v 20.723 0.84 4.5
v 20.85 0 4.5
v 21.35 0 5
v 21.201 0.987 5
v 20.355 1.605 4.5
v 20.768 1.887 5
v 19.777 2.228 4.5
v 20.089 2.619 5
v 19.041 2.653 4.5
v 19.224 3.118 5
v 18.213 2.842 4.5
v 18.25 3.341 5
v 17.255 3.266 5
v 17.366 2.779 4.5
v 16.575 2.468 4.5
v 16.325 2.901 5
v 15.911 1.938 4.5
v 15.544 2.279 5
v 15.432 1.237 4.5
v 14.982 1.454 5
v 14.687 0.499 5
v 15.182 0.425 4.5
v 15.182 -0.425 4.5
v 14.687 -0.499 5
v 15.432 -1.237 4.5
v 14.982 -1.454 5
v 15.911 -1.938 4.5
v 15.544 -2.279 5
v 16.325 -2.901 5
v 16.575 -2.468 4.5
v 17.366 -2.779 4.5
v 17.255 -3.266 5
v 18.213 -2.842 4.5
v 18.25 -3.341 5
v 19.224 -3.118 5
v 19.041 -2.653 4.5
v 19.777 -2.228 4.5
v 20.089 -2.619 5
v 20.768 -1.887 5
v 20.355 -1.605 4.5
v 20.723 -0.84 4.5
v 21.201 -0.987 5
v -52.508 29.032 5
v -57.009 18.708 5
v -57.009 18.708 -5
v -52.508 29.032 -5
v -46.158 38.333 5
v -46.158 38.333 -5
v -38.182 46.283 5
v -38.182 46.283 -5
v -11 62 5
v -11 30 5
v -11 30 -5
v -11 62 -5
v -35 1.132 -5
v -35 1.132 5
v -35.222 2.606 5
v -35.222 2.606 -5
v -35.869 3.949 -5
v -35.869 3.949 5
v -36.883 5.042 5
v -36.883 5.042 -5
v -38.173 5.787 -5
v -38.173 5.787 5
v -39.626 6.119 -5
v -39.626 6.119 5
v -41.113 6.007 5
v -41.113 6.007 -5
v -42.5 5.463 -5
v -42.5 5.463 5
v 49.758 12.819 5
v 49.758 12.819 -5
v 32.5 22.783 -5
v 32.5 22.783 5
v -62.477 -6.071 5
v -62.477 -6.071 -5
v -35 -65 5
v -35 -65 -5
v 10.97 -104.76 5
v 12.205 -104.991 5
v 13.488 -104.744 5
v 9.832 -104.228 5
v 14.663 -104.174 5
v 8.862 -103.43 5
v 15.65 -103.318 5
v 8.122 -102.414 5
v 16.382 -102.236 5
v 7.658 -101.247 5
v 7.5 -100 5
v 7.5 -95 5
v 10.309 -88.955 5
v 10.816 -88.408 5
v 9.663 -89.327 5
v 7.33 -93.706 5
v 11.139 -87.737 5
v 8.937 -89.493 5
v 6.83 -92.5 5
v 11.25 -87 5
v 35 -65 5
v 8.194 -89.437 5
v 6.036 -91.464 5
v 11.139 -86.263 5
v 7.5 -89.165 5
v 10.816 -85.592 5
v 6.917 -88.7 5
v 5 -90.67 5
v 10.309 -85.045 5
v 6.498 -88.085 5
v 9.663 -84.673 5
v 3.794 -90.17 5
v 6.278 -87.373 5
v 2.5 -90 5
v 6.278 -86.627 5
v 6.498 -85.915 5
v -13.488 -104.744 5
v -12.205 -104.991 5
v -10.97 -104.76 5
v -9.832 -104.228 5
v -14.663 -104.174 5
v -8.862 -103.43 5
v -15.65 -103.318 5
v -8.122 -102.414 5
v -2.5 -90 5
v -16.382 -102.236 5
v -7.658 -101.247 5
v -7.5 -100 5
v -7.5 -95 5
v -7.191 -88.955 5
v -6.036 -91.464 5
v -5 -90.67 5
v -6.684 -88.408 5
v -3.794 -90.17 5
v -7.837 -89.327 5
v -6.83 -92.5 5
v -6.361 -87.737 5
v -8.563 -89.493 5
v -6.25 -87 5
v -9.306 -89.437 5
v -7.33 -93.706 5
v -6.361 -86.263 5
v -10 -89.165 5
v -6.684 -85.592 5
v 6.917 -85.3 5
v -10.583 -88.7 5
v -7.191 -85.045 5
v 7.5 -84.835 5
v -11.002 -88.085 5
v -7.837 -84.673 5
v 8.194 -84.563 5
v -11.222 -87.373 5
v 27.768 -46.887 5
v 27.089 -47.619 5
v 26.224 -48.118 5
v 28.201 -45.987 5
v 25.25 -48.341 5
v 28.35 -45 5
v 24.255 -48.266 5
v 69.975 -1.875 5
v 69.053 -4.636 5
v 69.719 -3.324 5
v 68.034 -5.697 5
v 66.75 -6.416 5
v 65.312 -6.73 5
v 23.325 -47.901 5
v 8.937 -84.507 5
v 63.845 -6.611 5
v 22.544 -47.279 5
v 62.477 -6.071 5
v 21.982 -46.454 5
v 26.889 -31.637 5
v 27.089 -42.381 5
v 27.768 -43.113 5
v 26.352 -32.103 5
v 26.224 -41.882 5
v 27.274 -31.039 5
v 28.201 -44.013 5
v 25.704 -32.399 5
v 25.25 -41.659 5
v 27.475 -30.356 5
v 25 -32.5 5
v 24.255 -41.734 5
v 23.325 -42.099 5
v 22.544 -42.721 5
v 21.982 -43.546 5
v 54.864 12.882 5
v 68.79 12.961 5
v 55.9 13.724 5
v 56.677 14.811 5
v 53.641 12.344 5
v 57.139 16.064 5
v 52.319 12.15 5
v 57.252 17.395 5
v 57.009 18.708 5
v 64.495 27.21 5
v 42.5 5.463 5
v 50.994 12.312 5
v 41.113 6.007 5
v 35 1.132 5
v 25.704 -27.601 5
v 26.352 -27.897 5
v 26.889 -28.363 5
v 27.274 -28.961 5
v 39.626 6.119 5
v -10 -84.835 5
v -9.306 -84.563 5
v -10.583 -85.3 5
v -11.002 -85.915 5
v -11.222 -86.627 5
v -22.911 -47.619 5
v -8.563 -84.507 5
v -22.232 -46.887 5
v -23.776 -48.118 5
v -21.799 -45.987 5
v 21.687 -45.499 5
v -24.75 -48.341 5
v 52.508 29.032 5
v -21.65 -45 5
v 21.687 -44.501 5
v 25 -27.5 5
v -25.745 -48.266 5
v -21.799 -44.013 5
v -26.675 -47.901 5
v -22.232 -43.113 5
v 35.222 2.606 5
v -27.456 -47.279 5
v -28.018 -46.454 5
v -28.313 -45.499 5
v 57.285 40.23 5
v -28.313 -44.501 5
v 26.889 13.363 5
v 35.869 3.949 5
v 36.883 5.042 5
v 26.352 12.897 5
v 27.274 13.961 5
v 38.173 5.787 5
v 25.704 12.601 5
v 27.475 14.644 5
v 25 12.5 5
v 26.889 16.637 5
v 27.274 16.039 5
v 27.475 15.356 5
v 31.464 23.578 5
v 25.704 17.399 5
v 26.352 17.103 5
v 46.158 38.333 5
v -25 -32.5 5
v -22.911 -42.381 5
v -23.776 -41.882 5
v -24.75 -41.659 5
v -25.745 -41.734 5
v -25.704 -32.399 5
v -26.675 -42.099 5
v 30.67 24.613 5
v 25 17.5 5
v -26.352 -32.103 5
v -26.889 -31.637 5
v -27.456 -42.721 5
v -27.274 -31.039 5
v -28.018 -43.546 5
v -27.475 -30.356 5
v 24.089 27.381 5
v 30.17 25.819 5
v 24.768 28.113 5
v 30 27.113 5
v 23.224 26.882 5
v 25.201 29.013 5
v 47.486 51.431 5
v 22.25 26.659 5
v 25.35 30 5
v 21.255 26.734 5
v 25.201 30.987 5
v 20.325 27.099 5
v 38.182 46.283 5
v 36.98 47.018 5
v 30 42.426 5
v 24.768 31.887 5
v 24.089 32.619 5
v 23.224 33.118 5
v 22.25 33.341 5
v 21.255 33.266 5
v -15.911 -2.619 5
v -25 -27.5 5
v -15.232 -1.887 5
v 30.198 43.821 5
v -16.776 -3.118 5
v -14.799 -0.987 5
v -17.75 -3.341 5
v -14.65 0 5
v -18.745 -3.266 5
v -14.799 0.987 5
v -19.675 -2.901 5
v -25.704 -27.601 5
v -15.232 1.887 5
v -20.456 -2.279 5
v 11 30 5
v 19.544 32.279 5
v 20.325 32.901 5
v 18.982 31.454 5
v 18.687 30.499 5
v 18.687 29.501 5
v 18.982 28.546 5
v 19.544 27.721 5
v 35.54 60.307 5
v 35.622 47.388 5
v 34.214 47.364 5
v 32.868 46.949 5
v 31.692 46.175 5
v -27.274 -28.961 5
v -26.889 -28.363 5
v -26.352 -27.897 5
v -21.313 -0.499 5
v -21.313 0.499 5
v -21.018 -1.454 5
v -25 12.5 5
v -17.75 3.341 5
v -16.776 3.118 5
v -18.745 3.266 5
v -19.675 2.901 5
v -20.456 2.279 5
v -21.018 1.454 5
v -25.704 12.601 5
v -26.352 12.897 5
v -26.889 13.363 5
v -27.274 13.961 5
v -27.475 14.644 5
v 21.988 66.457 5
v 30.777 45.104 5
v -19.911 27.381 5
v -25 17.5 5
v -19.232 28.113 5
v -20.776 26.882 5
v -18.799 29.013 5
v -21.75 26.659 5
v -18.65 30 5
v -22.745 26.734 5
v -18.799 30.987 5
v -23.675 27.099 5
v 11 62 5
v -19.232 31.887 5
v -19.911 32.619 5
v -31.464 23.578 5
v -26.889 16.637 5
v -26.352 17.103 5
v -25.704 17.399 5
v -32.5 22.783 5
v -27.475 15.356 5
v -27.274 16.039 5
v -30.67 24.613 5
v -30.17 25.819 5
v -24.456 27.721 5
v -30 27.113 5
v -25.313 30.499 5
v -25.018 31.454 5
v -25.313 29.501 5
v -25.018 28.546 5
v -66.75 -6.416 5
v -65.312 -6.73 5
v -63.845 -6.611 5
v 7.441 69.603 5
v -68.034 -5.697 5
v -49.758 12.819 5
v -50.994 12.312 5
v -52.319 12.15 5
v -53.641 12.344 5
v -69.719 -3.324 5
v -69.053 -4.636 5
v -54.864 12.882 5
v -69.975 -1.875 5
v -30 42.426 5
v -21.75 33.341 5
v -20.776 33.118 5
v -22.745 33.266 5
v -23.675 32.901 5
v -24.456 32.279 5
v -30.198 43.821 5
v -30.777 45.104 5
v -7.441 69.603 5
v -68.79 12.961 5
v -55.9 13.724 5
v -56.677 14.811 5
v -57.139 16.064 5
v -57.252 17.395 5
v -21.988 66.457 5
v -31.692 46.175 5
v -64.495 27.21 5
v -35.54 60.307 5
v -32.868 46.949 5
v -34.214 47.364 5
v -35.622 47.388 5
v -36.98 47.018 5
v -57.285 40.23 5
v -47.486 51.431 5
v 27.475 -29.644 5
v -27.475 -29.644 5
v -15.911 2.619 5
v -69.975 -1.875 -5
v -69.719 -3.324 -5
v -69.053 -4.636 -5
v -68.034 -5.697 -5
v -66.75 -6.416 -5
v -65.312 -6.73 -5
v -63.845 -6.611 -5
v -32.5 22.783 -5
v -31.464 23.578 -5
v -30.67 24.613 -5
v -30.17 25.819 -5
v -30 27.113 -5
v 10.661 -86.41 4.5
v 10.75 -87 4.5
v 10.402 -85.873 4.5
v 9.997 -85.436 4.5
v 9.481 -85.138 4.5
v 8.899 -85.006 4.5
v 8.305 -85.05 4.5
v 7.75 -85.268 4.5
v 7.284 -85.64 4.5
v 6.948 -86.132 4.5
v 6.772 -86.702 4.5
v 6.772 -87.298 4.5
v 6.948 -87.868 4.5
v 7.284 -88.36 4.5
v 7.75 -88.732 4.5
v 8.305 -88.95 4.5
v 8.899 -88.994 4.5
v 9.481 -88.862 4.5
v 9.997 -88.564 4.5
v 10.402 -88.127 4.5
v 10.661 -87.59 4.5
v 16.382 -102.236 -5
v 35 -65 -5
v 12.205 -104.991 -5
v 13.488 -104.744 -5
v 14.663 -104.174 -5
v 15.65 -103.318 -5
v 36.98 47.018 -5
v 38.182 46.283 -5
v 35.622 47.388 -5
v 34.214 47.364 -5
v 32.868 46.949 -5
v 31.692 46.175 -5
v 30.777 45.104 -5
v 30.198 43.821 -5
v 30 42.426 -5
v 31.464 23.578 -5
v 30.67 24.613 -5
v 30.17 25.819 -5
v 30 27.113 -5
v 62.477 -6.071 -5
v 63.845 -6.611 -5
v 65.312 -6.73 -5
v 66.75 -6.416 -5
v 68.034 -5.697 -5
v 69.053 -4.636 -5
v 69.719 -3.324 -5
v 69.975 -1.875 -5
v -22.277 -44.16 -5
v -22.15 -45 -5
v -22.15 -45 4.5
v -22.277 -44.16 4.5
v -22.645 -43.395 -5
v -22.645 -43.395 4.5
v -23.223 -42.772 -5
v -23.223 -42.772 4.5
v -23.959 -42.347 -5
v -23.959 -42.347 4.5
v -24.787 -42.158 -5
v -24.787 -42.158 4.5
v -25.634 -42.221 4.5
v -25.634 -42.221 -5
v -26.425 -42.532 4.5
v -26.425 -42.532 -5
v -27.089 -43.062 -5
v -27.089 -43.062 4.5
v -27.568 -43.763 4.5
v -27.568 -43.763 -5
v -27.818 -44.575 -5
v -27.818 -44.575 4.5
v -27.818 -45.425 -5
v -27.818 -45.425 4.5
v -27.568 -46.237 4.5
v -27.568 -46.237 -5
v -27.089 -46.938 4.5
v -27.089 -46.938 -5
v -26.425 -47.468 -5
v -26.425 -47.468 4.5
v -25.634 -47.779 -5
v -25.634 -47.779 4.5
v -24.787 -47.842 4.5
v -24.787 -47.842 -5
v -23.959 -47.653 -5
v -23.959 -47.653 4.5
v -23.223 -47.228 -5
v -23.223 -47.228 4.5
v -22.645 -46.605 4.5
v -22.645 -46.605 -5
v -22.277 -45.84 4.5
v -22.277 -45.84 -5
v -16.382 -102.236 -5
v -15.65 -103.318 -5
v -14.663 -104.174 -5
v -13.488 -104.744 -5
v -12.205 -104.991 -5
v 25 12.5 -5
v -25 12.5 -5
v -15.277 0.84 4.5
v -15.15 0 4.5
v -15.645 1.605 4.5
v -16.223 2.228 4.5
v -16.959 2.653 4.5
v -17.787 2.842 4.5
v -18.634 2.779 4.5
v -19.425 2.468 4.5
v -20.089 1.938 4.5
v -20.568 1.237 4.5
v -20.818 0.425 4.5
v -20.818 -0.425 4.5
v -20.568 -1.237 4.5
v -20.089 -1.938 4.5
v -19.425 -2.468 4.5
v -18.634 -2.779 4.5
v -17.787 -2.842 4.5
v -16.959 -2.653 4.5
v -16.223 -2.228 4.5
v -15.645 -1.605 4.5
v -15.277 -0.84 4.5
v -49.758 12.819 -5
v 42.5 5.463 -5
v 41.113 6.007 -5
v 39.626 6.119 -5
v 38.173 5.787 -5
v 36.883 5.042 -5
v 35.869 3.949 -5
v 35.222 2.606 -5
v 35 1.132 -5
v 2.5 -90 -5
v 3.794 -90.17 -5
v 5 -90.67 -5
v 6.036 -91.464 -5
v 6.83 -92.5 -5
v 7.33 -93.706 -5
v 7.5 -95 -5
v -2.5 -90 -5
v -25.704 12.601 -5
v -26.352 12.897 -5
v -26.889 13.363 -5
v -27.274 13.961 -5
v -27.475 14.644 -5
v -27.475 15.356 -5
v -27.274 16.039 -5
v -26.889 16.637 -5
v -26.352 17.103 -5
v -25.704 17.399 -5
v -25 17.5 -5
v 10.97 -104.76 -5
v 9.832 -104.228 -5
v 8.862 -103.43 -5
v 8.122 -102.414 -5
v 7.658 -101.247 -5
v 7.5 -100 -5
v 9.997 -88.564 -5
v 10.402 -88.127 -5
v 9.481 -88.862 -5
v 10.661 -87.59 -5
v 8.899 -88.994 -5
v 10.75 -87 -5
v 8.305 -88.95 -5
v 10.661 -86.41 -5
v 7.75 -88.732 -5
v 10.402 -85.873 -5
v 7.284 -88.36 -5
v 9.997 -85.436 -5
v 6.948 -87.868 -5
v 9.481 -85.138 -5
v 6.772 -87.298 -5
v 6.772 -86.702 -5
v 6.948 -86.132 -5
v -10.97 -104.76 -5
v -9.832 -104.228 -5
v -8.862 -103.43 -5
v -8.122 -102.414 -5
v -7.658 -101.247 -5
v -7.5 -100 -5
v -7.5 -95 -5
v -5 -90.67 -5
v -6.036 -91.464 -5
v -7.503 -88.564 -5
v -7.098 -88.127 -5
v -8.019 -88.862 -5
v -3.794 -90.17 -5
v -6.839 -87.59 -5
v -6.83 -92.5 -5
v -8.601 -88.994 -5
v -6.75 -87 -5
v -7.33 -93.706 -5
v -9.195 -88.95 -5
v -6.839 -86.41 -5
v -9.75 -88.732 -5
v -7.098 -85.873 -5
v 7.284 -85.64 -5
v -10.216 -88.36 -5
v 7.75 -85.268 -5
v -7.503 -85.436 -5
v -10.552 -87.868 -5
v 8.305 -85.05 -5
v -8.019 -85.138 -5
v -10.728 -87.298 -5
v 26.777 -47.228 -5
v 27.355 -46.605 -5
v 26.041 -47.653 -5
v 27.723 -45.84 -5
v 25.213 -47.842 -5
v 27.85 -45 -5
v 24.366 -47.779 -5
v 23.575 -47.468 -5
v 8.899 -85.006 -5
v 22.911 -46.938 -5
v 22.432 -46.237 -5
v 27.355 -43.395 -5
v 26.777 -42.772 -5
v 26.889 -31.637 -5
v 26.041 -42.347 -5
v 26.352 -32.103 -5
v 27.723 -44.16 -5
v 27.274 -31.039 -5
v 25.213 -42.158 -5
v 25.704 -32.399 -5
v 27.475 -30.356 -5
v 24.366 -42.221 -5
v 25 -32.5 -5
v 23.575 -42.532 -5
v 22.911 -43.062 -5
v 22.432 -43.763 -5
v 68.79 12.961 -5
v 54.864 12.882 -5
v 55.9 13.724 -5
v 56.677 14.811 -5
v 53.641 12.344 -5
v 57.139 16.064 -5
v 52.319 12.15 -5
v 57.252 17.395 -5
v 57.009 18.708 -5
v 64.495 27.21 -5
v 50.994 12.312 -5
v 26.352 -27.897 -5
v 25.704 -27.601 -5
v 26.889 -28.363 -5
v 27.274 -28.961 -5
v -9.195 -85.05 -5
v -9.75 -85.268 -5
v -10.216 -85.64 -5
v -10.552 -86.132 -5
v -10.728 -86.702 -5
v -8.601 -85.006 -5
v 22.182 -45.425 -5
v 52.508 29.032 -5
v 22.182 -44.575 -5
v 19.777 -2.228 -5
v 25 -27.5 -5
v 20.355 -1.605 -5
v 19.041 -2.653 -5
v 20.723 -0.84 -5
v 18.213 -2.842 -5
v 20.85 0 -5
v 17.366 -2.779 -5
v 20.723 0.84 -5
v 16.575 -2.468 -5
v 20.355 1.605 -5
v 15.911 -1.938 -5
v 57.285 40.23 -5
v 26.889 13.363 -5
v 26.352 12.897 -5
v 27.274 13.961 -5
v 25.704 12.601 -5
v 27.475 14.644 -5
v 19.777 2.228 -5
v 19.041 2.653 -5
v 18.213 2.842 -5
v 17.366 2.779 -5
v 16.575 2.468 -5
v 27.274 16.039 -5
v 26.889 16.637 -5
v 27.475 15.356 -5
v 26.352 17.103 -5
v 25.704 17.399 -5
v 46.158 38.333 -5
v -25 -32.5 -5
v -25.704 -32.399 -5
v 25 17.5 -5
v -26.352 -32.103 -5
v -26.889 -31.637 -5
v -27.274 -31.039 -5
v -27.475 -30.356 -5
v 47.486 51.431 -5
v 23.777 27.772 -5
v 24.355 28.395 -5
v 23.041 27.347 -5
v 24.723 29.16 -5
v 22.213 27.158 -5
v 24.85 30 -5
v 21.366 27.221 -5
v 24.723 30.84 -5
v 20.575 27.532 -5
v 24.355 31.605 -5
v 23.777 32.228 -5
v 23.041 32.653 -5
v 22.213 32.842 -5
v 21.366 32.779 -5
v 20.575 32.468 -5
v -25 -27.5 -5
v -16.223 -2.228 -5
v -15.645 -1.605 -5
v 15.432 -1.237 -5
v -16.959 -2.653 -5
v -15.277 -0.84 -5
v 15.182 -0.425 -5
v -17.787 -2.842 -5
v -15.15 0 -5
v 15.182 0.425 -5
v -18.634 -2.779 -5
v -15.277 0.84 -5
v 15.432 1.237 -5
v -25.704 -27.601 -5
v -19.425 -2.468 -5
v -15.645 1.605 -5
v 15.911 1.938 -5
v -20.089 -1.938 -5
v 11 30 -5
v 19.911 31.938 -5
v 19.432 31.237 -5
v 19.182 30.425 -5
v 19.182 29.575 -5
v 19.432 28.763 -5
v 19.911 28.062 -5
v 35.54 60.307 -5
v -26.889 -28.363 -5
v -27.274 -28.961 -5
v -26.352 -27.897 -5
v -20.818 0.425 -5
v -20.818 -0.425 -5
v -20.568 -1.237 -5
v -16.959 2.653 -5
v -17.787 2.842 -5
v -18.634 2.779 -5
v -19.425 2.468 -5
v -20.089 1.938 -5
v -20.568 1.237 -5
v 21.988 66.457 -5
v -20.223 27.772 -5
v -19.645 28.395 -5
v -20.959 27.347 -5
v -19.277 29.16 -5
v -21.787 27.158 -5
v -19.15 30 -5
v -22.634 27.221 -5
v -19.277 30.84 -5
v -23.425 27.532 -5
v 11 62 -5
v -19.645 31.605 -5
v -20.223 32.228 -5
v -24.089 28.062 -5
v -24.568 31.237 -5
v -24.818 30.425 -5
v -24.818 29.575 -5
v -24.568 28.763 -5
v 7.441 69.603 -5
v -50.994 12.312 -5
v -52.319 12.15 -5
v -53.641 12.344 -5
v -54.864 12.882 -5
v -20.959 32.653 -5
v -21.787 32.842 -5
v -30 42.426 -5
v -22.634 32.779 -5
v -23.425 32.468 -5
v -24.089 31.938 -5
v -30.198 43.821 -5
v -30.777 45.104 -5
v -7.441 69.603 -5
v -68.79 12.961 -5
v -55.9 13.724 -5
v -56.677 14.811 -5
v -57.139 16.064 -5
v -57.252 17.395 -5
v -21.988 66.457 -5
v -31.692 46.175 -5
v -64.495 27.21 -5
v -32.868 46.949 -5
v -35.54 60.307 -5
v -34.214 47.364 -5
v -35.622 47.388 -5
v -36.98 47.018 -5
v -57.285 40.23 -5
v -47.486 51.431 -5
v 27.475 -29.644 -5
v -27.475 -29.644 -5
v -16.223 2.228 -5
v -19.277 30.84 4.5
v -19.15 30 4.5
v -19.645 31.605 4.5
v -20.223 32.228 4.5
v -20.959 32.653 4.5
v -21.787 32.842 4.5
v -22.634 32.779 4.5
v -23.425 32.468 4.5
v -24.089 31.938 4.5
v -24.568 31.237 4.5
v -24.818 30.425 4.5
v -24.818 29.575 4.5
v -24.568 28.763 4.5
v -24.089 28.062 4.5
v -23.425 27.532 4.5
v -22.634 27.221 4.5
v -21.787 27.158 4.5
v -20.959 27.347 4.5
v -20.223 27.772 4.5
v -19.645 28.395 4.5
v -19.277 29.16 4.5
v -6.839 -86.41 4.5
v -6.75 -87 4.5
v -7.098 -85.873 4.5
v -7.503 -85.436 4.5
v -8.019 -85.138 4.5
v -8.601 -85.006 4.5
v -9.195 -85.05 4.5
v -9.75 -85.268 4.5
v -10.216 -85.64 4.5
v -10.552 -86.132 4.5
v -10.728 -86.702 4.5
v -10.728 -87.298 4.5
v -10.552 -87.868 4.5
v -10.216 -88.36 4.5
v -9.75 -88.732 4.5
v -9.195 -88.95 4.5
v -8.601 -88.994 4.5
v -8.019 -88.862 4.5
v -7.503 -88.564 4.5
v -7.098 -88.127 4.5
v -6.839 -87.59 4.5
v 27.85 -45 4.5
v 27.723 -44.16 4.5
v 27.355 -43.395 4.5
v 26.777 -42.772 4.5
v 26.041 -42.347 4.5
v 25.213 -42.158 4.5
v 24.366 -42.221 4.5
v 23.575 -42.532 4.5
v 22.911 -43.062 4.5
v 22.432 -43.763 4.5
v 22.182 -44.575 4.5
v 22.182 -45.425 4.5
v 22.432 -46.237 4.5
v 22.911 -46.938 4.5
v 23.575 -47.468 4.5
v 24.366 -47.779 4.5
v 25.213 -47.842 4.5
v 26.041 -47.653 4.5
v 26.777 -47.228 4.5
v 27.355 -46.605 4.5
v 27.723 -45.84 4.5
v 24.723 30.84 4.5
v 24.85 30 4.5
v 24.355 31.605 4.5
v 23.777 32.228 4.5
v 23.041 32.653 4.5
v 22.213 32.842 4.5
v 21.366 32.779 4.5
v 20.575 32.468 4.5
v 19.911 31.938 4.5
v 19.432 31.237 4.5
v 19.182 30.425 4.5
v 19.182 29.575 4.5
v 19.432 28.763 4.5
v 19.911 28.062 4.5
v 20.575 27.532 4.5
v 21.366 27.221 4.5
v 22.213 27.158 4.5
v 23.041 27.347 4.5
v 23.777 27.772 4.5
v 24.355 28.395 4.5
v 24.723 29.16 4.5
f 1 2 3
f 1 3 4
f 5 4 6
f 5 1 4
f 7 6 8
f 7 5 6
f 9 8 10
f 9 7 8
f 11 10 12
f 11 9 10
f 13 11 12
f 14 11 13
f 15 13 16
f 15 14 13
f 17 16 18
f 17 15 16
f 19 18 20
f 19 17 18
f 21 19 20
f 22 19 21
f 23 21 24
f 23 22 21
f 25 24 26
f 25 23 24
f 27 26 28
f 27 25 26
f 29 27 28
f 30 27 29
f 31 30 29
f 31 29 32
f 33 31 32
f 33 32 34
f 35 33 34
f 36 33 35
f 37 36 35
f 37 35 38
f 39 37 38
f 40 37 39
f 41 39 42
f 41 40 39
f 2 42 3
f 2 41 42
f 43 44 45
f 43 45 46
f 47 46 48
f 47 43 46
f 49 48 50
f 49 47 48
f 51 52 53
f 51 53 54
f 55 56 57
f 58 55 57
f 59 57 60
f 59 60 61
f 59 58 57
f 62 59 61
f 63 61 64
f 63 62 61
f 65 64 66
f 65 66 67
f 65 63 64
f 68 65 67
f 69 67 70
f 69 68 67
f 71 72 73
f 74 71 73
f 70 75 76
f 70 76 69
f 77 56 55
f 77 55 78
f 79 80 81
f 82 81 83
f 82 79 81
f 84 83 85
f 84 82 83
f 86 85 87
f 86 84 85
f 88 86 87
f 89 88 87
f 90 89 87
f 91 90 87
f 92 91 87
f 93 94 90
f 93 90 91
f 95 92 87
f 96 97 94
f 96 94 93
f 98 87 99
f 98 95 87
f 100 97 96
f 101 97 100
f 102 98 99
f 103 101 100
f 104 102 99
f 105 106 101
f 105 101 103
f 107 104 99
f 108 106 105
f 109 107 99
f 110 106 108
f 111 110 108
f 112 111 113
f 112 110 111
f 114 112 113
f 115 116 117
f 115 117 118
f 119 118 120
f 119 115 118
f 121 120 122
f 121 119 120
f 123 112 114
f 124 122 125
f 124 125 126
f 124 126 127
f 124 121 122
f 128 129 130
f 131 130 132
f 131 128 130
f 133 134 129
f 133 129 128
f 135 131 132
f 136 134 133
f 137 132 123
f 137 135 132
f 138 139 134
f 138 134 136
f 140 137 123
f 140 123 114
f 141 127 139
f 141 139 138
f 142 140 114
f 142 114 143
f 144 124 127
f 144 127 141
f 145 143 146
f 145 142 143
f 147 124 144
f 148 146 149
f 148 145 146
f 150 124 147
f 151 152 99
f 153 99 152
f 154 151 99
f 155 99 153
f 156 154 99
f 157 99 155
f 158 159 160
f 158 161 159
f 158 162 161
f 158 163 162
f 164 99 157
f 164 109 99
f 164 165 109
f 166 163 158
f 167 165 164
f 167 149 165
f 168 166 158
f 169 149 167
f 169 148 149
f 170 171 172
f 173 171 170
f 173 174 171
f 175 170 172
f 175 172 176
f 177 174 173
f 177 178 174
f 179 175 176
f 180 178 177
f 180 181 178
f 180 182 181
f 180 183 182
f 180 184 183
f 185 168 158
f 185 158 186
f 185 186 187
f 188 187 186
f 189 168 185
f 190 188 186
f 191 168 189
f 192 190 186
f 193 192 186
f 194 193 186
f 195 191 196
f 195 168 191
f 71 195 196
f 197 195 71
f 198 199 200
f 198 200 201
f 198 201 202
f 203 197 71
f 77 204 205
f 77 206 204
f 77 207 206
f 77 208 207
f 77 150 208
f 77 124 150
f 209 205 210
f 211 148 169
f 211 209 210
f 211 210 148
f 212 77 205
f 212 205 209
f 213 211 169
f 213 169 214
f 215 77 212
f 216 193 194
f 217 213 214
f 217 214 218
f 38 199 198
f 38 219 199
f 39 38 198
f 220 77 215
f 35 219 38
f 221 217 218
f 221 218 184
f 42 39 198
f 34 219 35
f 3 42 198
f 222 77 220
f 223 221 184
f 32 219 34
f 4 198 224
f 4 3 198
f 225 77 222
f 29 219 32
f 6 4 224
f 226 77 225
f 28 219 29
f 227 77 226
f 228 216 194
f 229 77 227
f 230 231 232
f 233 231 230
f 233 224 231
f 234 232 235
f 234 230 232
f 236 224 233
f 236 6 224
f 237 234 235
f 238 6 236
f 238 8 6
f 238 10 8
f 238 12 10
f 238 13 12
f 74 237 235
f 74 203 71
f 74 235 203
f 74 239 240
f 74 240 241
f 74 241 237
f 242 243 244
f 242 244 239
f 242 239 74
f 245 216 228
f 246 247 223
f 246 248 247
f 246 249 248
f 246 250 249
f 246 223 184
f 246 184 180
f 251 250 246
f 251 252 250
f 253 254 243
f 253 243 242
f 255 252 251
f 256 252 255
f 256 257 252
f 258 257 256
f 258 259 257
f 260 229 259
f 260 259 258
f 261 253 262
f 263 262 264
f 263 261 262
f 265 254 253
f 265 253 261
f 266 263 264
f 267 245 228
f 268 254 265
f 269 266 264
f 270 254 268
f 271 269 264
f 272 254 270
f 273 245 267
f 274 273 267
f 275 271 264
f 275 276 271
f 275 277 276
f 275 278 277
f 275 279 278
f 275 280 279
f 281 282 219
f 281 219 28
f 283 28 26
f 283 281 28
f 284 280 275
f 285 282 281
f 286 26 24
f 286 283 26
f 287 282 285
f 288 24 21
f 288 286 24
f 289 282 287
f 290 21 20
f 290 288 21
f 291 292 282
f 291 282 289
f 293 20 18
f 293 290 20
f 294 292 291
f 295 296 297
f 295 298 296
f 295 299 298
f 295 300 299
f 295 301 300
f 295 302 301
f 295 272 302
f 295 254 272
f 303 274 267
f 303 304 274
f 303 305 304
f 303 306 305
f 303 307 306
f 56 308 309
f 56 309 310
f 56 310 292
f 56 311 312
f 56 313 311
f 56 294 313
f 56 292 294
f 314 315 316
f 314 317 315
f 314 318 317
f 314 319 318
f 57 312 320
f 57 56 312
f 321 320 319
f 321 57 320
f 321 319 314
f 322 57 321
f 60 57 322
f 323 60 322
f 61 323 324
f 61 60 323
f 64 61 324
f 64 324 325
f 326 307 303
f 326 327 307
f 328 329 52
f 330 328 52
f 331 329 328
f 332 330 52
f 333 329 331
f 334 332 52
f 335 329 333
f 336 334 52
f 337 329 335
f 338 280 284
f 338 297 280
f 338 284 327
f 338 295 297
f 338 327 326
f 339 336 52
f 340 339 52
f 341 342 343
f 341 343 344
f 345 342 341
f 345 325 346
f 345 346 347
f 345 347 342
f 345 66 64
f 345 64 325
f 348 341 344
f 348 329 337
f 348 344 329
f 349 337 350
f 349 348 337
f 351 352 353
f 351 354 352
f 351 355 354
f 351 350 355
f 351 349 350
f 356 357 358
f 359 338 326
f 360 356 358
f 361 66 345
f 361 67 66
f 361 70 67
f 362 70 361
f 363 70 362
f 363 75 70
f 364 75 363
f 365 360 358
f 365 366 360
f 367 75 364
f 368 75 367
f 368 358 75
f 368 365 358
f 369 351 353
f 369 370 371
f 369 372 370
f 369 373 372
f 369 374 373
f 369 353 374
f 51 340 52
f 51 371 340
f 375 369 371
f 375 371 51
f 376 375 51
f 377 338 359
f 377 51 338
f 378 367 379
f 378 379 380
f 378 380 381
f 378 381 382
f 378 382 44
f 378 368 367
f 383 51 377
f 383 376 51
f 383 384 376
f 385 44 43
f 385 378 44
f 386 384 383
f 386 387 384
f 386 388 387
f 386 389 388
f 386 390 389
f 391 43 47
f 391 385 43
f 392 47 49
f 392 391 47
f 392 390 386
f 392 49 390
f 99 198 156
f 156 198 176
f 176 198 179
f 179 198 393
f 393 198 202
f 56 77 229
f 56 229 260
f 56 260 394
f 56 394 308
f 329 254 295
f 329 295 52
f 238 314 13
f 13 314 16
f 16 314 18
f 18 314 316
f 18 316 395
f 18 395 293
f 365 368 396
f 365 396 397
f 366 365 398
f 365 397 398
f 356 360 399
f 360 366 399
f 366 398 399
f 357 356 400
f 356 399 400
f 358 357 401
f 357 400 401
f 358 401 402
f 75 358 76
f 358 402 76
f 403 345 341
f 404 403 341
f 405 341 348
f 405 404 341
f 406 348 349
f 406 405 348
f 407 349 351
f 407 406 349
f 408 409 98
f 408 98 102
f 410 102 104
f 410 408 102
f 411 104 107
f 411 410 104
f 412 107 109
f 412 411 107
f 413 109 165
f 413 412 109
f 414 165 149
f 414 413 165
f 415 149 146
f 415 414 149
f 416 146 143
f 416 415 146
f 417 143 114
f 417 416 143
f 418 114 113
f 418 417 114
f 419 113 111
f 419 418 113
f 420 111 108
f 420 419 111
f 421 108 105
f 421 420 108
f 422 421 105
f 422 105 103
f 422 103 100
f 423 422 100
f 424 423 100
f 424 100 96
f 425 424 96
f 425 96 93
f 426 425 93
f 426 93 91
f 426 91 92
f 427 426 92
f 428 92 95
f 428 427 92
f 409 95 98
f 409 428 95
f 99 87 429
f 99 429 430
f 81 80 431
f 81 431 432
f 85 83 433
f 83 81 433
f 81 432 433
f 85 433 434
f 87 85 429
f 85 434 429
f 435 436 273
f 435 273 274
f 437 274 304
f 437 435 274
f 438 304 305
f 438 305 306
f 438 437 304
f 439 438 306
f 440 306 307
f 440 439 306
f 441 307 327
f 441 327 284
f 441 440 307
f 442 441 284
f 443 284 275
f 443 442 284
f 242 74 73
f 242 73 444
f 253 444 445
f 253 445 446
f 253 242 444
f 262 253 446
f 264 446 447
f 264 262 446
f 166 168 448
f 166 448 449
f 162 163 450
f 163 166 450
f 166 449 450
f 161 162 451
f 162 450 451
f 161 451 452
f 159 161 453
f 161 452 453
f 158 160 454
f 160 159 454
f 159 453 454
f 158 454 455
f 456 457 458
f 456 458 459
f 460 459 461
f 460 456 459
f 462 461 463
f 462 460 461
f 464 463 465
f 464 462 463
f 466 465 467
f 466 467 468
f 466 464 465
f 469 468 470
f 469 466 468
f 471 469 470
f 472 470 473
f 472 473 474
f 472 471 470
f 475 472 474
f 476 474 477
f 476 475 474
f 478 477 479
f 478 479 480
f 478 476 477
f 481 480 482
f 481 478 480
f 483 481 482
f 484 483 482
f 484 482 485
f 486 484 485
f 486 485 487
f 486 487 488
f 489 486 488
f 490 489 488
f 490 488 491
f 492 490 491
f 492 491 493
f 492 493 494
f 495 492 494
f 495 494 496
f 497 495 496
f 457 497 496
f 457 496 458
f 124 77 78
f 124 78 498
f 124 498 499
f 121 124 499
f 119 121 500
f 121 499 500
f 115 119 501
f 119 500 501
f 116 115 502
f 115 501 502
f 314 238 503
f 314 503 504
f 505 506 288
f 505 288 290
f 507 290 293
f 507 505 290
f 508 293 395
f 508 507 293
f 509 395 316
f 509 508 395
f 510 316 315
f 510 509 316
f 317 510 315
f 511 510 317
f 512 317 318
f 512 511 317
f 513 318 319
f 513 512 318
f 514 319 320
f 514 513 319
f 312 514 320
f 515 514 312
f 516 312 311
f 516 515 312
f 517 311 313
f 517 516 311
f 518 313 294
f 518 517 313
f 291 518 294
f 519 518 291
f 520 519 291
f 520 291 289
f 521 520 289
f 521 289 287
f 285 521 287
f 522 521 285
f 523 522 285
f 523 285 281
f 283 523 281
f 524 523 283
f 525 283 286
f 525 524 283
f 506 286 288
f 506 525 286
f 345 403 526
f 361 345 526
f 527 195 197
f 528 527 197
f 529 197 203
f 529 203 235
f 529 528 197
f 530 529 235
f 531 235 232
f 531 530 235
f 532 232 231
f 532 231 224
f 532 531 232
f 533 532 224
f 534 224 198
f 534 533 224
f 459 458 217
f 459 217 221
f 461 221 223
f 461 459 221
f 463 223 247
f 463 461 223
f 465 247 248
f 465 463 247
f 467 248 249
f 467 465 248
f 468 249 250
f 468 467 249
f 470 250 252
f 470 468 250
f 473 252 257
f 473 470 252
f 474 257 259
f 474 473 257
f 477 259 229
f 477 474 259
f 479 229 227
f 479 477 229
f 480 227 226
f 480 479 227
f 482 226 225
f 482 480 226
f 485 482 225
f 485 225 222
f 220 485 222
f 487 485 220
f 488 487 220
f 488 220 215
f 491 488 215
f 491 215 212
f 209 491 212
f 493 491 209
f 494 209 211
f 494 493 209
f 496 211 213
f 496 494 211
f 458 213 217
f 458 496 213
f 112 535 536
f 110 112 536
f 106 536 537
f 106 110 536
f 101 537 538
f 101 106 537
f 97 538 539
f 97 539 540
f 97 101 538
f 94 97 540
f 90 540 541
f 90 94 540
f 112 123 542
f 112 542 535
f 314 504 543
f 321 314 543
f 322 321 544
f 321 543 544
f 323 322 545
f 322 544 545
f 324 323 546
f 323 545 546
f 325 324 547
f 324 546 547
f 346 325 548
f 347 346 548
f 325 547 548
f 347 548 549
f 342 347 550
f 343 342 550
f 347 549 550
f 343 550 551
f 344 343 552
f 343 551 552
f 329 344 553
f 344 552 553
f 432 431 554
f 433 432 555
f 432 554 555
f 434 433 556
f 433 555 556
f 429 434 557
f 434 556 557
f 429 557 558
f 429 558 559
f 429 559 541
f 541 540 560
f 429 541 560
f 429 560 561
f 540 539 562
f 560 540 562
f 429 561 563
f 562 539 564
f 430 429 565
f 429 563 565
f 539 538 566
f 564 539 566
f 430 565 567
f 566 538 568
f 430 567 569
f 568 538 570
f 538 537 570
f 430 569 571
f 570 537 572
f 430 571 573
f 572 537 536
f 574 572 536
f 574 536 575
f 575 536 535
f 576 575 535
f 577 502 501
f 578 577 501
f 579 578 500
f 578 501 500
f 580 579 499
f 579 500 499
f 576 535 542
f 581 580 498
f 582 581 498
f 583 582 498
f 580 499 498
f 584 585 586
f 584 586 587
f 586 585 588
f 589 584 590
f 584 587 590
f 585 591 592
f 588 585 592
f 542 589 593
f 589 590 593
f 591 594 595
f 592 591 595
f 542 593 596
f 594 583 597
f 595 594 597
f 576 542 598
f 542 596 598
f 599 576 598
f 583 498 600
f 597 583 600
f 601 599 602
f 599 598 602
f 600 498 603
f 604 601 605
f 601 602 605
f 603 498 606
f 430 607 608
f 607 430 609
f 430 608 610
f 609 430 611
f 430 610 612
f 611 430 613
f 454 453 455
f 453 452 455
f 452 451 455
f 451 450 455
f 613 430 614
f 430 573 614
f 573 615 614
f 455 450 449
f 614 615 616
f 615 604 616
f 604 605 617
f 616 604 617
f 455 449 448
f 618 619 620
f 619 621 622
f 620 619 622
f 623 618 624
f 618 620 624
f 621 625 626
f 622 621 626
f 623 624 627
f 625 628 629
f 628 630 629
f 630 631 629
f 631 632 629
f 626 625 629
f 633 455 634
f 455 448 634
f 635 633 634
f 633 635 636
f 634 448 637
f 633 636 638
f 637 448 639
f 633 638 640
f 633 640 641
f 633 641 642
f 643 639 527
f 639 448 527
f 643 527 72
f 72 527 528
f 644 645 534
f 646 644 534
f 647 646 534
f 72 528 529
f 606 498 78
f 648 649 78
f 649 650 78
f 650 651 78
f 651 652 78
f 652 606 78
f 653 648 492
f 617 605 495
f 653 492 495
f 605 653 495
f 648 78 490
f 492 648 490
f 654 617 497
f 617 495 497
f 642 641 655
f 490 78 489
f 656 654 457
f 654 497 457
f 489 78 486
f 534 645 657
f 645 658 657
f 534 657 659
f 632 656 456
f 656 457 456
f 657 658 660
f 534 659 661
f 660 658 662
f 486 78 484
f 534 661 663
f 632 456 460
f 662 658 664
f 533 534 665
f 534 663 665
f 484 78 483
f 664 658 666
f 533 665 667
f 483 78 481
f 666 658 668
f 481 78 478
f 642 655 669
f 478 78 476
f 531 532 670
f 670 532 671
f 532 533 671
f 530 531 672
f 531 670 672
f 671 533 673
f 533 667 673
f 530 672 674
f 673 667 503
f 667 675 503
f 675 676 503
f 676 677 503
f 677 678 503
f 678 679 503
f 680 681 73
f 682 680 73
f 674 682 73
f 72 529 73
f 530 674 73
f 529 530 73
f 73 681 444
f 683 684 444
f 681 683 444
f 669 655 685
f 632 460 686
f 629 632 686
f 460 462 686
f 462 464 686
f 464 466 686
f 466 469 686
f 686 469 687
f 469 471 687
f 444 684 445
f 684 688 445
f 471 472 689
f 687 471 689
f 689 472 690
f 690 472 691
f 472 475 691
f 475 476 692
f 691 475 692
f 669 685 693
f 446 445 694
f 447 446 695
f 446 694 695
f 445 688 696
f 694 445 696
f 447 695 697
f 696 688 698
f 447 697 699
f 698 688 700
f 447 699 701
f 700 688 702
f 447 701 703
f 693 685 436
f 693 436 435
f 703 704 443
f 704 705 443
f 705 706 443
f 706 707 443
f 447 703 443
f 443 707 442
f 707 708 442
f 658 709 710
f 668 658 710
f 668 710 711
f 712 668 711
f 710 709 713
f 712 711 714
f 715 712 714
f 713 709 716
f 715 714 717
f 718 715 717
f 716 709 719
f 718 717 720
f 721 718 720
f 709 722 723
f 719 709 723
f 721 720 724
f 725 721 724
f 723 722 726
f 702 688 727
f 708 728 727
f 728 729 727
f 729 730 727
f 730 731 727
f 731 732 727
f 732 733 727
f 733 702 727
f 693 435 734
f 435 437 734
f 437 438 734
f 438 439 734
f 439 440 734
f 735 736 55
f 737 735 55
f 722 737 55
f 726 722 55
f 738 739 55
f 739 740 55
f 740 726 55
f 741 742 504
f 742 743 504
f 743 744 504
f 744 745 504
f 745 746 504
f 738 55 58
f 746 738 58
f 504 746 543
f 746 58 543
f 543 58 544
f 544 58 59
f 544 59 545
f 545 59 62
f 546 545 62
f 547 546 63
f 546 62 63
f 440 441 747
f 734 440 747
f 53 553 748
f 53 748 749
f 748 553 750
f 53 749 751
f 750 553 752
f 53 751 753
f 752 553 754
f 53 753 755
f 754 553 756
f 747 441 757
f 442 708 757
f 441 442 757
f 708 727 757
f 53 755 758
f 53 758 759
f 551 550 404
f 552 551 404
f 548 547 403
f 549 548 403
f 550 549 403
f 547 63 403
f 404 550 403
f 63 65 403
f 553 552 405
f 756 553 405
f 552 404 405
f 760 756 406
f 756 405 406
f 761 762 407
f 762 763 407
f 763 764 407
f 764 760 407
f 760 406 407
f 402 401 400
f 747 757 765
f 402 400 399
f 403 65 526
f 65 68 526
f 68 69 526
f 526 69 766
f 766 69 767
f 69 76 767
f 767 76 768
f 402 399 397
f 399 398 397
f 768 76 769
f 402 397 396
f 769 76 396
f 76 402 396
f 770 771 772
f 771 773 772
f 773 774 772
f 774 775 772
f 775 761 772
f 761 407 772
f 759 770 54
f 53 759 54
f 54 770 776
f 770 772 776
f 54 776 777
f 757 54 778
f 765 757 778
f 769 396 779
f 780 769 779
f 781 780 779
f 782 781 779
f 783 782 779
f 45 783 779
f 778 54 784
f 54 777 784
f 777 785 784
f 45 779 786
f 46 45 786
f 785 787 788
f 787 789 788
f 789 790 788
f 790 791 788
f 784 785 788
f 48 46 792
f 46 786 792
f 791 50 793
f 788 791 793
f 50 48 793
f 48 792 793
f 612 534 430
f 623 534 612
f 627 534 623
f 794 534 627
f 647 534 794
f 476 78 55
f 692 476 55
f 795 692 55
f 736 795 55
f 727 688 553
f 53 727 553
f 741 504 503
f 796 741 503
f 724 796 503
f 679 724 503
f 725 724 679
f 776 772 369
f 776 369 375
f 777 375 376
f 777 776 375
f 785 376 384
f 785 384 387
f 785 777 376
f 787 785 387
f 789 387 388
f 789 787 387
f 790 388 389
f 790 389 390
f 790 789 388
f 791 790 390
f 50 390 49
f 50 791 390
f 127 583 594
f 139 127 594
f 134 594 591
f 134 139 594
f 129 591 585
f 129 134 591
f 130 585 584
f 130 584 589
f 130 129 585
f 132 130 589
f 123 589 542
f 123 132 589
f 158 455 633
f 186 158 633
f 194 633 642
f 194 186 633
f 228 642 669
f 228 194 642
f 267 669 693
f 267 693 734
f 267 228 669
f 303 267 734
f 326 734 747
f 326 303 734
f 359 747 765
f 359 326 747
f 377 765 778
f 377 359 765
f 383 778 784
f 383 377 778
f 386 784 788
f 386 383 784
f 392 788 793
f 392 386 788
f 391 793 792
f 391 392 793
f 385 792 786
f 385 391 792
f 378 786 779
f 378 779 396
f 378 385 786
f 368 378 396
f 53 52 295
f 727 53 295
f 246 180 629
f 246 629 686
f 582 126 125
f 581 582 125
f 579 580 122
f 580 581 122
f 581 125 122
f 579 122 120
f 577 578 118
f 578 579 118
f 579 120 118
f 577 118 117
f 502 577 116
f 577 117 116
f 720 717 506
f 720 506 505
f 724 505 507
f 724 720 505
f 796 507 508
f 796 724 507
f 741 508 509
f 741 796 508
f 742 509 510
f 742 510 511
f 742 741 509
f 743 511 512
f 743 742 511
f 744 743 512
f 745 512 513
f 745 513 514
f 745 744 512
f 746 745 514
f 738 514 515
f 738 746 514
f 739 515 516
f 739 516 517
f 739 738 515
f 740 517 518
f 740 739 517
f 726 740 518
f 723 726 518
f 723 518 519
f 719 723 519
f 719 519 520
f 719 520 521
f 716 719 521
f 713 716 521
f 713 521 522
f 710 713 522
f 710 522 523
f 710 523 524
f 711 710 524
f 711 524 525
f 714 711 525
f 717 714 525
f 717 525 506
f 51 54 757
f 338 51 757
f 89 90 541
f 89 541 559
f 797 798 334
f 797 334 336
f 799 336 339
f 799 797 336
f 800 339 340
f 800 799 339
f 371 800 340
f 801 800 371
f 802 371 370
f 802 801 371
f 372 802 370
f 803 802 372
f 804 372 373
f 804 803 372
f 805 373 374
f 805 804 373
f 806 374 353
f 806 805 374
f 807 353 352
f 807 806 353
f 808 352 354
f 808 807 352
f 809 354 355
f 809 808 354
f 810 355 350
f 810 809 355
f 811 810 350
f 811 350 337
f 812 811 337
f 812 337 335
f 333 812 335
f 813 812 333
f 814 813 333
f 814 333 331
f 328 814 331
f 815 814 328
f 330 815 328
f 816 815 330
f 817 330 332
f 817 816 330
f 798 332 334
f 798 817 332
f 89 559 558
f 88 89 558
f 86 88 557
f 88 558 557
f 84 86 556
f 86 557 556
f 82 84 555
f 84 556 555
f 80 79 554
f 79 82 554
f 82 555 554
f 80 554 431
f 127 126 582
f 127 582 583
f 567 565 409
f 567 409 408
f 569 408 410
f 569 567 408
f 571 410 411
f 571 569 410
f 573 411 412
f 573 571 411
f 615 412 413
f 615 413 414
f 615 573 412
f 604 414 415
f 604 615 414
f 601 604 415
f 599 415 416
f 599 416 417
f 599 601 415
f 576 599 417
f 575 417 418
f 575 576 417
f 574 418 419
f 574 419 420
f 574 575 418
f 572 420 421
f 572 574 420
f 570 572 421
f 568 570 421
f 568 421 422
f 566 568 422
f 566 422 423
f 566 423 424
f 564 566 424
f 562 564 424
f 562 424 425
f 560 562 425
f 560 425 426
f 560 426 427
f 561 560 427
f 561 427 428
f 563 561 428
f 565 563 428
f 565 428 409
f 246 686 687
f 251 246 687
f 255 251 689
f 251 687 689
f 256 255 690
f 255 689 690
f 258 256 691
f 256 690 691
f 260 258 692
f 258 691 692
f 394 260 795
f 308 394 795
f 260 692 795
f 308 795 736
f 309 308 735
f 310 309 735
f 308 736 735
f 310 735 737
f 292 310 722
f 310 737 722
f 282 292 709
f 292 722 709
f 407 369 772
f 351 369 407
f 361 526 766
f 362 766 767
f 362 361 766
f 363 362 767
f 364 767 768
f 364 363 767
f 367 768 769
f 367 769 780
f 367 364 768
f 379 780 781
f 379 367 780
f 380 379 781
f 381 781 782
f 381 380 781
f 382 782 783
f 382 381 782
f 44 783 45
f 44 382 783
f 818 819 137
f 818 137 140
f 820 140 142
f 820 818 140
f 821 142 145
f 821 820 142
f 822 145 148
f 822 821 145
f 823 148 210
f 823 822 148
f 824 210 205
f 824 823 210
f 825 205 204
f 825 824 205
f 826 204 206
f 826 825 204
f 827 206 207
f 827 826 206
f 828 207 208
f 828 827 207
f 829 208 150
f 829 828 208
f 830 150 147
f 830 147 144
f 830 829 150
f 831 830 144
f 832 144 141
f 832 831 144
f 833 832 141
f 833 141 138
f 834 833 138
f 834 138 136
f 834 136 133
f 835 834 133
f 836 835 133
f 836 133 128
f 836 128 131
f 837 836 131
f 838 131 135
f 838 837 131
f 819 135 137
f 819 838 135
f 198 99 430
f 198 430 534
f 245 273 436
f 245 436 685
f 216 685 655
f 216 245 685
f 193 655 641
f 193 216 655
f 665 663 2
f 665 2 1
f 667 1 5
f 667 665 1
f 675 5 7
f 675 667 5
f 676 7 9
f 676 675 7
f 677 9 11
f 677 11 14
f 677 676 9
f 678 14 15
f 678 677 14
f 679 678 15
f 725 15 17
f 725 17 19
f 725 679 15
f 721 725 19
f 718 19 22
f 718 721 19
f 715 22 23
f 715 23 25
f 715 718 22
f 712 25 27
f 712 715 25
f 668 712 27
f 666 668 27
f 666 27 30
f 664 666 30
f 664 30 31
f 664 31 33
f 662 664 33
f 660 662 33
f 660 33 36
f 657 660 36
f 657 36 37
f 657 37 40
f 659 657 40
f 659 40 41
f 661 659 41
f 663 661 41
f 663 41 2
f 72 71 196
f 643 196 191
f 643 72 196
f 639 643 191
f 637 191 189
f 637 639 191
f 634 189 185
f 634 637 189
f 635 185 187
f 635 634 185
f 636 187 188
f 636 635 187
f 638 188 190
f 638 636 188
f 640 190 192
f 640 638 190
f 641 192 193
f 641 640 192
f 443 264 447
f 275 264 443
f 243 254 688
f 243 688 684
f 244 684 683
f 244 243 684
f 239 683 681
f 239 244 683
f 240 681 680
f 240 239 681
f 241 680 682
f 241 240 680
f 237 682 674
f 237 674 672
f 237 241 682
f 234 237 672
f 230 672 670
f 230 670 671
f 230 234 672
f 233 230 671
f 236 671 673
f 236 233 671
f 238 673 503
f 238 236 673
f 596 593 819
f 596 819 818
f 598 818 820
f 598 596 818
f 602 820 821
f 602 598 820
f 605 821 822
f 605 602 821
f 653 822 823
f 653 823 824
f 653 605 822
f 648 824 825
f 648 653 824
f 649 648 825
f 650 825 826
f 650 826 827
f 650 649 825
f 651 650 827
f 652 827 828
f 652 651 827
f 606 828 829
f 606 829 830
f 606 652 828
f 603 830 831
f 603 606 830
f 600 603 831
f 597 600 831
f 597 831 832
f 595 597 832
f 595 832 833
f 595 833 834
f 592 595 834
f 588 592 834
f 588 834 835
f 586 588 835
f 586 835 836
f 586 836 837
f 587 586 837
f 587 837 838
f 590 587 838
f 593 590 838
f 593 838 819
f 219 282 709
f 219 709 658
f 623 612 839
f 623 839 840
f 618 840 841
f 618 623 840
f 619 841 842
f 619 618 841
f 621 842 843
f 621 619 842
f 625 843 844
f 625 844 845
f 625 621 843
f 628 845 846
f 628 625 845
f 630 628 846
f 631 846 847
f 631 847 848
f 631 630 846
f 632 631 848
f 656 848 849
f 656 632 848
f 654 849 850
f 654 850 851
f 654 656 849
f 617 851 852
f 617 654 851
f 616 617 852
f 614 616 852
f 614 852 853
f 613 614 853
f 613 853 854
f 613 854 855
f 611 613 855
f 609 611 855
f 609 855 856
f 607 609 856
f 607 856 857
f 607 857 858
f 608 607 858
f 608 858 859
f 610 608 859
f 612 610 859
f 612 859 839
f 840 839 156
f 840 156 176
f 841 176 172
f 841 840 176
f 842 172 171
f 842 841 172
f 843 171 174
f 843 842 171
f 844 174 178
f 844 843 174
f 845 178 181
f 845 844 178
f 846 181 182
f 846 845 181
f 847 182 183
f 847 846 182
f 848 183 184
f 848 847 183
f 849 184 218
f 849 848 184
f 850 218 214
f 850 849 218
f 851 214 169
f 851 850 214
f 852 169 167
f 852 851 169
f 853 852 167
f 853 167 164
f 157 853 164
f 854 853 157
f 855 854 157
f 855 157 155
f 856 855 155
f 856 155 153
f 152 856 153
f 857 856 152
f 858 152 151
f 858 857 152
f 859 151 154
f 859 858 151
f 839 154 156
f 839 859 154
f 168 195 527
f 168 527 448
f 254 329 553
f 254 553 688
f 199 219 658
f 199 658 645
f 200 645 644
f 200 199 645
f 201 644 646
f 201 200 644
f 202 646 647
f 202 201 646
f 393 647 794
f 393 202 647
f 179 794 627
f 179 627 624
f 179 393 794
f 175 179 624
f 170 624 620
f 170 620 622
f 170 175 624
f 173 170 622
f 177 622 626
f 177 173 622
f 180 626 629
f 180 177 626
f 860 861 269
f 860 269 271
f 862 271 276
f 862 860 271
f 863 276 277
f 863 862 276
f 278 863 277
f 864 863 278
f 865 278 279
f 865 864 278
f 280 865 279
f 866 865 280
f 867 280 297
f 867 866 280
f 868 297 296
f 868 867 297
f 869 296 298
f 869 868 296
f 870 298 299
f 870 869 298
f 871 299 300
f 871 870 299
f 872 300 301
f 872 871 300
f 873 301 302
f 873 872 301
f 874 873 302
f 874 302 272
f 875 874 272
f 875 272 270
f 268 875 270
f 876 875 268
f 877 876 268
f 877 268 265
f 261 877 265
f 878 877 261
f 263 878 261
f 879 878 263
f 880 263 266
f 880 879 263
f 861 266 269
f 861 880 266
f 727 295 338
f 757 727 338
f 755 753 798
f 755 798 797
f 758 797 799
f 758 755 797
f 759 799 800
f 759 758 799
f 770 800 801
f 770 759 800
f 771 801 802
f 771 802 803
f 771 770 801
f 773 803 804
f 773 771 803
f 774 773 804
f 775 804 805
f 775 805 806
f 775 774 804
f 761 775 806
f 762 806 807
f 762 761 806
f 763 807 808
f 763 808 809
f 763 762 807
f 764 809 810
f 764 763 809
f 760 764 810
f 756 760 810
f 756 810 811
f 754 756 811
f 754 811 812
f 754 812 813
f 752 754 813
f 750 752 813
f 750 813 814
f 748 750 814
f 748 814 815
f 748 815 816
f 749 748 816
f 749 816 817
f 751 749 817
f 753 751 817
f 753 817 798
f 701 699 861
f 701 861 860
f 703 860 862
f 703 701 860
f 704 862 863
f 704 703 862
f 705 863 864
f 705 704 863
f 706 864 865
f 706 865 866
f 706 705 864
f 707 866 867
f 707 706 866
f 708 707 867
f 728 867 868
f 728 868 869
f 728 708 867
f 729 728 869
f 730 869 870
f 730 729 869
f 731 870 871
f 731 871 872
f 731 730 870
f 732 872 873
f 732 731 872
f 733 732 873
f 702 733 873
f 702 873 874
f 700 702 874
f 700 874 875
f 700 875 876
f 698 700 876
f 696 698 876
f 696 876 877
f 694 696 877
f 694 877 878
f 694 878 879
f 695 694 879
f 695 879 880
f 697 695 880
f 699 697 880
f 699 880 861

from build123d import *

# Parameters (mm, degrees)
SKETCH4_R           = 2
SKETCH4_R_2         = 2.85
SKETCH4_W           = 22
SKETCH4_H           = 32
BOSS_EXTRUDE1_DEPTH = 5
FILLET1_R           = 5
CHAMFER1_SIZE       = 0.5


with BuildPart() as part:
    # Sketch4 → Boss-Extrude1 (new, symmetric)
    with BuildSketch(Plane.XY):
        with BuildLine():
            ThreePointArc((69.282032303, -10), (0, 70), (-69.282032303, -10))
            Line((-69.282032303, -10), (-35, 9.792740578))
            Line((-35, 9.792740578), (-35, -55))
            Line((-35, -55), (-35, -65))
            Line((-35, -65), (-15, -105))
            Line((-15, -105), (-7.5, -105))
            Line((-7.5, -105), (-7.5, -90))
            Line((-7.5, -90), (7.5, -90))
            Line((7.5, -90), (7.5, -105))
            Line((7.5, -105), (15, -105))
            Line((15, -105), (35, -65))
            Line((35, -65), (35, 9.792740578))
            Line((35, 9.792740578), (69.282032303, -10))
        make_face()
        with Locations((-8.75, -87)):
            Circle(SKETCH4_R, mode=Mode.SUBTRACT)
        with Locations((-25, -45)):
            Circle(SKETCH4_R_2, mode=Mode.SUBTRACT)
        with Locations((8.75, -87)):
            Circle(SKETCH4_R, mode=Mode.SUBTRACT)
        with Locations((25, -45)):
            Circle(SKETCH4_R_2, mode=Mode.SUBTRACT)
        with BuildLine():
            Line((25, -32.5), (-25, -32.5))
            ThreePointArc((-25, -32.5), (-27.5, -30), (-25, -27.5))
            Line((-25, -27.5), (25, -27.5))
            ThreePointArc((25, -27.5), (27.5, -30), (25, -32.5))
        make_face(mode=Mode.SUBTRACT)
        with Locations((-18, 0)):
            Circle(SKETCH4_R_2, mode=Mode.SUBTRACT)
        with BuildLine():
            Line((-30, 24.226497308), (-59.572090597, 7.153042841))
            ThreePointArc((-59.572090597, 7.153042841), (-50.077338732, 33.04935923), (-30, 51.961524227))
            Line((-30, 51.961524227), (-30, 24.226497308))
        make_face(mode=Mode.SUBTRACT)
        with Locations((-22, 30)):
            Circle(SKETCH4_R_2, mode=Mode.SUBTRACT)
        with Locations((0, 46)):
            Rectangle(SKETCH4_W, SKETCH4_H, mode=Mode.SUBTRACT)
        with Locations((18, 0)):
            Circle(SKETCH4_R_2, mode=Mode.SUBTRACT)
        with BuildLine():
            Line((25, 12.5), (-25, 12.5))
            ThreePointArc((-25, 12.5), (-27.5, 15), (-25, 17.5))
            Line((-25, 17.5), (25, 17.5))
            ThreePointArc((25, 17.5), (27.5, 15), (25, 12.5))
        make_face(mode=Mode.SUBTRACT)
        with Locations((22, 30)):
            Circle(SKETCH4_R_2, mode=Mode.SUBTRACT)
        with BuildLine():
            Line((59.572090597, 7.153042841), (30, 24.226497308))
            Line((30, 24.226497308), (30, 51.961524227))
            ThreePointArc((30, 51.961524227), (50.077338732, 33.04935923), (59.572090597, 7.153042841))
        make_face(mode=Mode.SUBTRACT)
    extrude(amount=BOSS_EXTRUDE1_DEPTH, both=True)

    # Fillet1
    # the kernel refuses this fillet: 5 mm, written as the material it adds along each edge
    with BuildSketch(Plane(origin=(59.572090597, 7.153042841, -5), x_dir=(-0.8660254037844397, 0.49999999999999806, 0), z_dir=(0, 0, 1))) as fillet1_piece_1:
        with BuildLine():
            CenterArc((11.332313176, -5), FILLET1_R, 90, 138.168098297)
            ThreePointArc((7.997575975, -8.725523829), (3.783101322, -4.560454399), (0, 0))
            Line((0, 0), (11.332313176, 0))
        make_face()
    extrude(amount=10)
    with BuildSketch(Plane(origin=(30, 24.226497308, 5), x_dir=(0, 1, 0), z_dir=(0, 0, -1))) as fillet1_piece_2:
        with BuildLine():
            CenterArc((FILLET1_R * 0.57735026919, FILLET1_R), FILLET1_R, 210, 60)
            Line((-FILLET1_R * 0.288675134595, FILLET1_R * 0.5), (0, 0))
            Line((0, 0), (FILLET1_R * 0.57735026919, 0))
        make_face()
    extrude(amount=10)
    with BuildSketch(Plane(origin=(30, 51.961524227, -5), x_dir=(0, -1, 0), z_dir=(0, 0, 1))) as fillet1_piece_3:
        with BuildLine():
            CenterArc((9.535117356, 5), FILLET1_R, 140.478803641, 129.521196359)
            ThreePointArc((5.678171277, 8.181818182), (2.669034839, 4.208924127), (0, 0))
            Line((0, 0), (9.535117356, 0))
        make_face()
    extrude(amount=10)
    with BuildSketch(Plane(origin=(-59.572090597, 7.153042841, 5), x_dir=(0.2165677144201491, 0.9762675991094004, 0), z_dir=(0, 0, -1))) as fillet1_piece_4:
        with BuildLine():
            CenterArc((11.343039457, 4.975618333), FILLET1_R, 137.492482071, 138.168098297)
            Line((7.657096034, 8.354053043), (0, 0))
            ThreePointArc((0, 0), (5.918107543, -0.29258), (11.836215086, 0))
        make_face()
    extrude(amount=10)
    with BuildSketch(Plane(origin=(-30, 24.226497308, -5), x_dir=(-0.8660254037844397, -0.49999999999999795, 0), z_dir=(0, 0, 1))) as fillet1_piece_5:
        with BuildLine():
            CenterArc((FILLET1_R * 0.57735026919, -FILLET1_R), FILLET1_R, 90, 60)
            Line((-FILLET1_R * 0.288675134595, -FILLET1_R * 0.5), (0, 0))
            Line((0, 0), (FILLET1_R * 0.57735026919, 0))
        make_face()
    extrude(amount=10)
    with BuildSketch(Plane(origin=(-30, 51.961524227, -5), x_dir=(-0.8215414898046486, -0.5701487354450225, 0), z_dir=(0, 0, 1))) as fillet1_piece_6:
        with BuildLine():
            CenterArc((9.544142552, 4.982750841), FILLET1_R, 145.239401821, 129.521196359)
            Line((5.436435103, 7.833494518), (0, 0))
            ThreePointArc((0, 0), (4.979552636, -0.206989911), (9.959105271, 0))
        make_face()
    extrude(amount=10)
    with BuildSketch(Plane(origin=(35, 9.792740578, -5), x_dir=(0.8660254037844399, -0.49999999999999795, 0), z_dir=(0, 0, 1)), Plane(origin=(-35, 9.792740578, -5), x_dir=(0, -1, 0), z_dir=(0, 0, 1))) as fillet1_piece_7:
        with BuildLine():
            CenterArc((FILLET1_R * 1.73205080757, -FILLET1_R), FILLET1_R, 90, 120)
            Line((FILLET1_R * 0.866025403784, -FILLET1_R * 1.5), (0, 0))
            Line((0, 0), (FILLET1_R * 1.73205080757, 0))
        make_face()
    extrude(amount=10)
    with BuildSketch(Plane(origin=(7.5, -90, 5), x_dir=(0, -1, 0), z_dir=(0, 0, -1)), Plane(origin=(-7.5, -90, 5), x_dir=(1, 0, 0), z_dir=(0, 0, -1))) as fillet1_piece_8:
        with BuildLine():
            CenterArc((FILLET1_R, FILLET1_R), FILLET1_R, 180, 90)
            Line((0, FILLET1_R), (0, 0))
            Line((0, 0), (FILLET1_R, 0))
        make_face()
    extrude(amount=10)
    # the kernel refuses this fillet: 5 mm, written as the material it takes off along each edge
    with BuildSketch(Plane(origin=(-69.282032303, -10, -25.386938297), x_dir=(-0.08496362878818808, 0.9963840533565073, 0), z_dir=(0, 0, 1))) as fillet1_2_piece_1:
        with BuildLine():
            CenterArc((7.863533343, -4.991510604), FILLET1_R, 86.660722685, 118.465343928)
            Line((3.33665476, -7.114567433), (0, 0))
            ThreePointArc((0, 0), (4.077387659, 0.118851542), (8.154775319, 0))
        make_face()
    extrude(amount=50.773876593, mode=Mode.SUBTRACT)
    with BuildSketch(Plane(origin=(69.282032303, -10, -25.386938297), x_dir=(-0.8660254037844397, 0.4999999999999982, 0), z_dir=(0, 0, 1))) as fillet1_2_piece_2:
        with BuildLine():
            CenterArc((7.858138122, -5), FILLET1_R, 90, 118.465343928)
            ThreePointArc((3.462610285, -7.383135547), (1.623699843, -3.742033489), (0, 0))
            Line((0, 0), (7.858138122, 0))
        make_face()
    extrude(amount=50.773876593, mode=Mode.SUBTRACT)
    with BuildSketch(Plane(origin=(15, -105, -12.725424859), x_dir=(-1, 0, 0), z_dir=(0, 0, 1)), Plane(origin=(-15, -105, -12.725424859), x_dir=(-0.4472135954999598, 0.894427190999915, 0), z_dir=(0, 0, 1))) as fillet1_2_piece_3:
        with BuildLine():
            CenterArc((FILLET1_R * 0.61803398875, -FILLET1_R), FILLET1_R, 90, 63.434948823)
            Line((-FILLET1_R * 0.27639320225, -FILLET1_R * 0.5527864045), (0, 0))
            Line((0, 0), (FILLET1_R * 0.61803398875, 0))
        make_face()
    extrude(amount=25.450849719, mode=Mode.SUBTRACT)
    with BuildSketch(Plane(origin=(7.5, -105, -17.5), x_dir=(0, 1, 0), z_dir=(0, 0, 1))) as fillet1_2_piece_4:
        with BuildLine():
            CenterArc((FILLET1_R, -FILLET1_R), FILLET1_R, 90, 90)
            Line((0, -FILLET1_R), (0, 0))
            Line((0, 0), (FILLET1_R, 0))
        make_face()
    extrude(amount=35, mode=Mode.SUBTRACT)
    with BuildSketch(Plane(origin=(-7.5, -105, 17.5), x_dir=(-1, 0, 0), z_dir=(0, 0, -1))) as fillet1_2_piece_5:
        with BuildLine():
            CenterArc((FILLET1_R, FILLET1_R), FILLET1_R, 180, 90)
            Line((0, FILLET1_R), (0, 0))
            Line((0, 0), (FILLET1_R, 0))
        make_face()
    extrude(amount=35, mode=Mode.SUBTRACT)

    # Chamfer1
    chamfer1_edges = [part.edges().sort_by_distance(p)[0] for p in [
        (22.15, -45, 5),
        (19.15, 30, 5),
        (15.15, 0, 5),
        (6.75, -87, 5),
        (-10.75, -87, 5),
        (-24.85, 30, 5),
        (-20.85, 0, 5),
        (-27.85, -45, 5),
    ]]
    chamfer(chamfer1_edges, length=CHAMFER1_SIZE)


solid = part.part
